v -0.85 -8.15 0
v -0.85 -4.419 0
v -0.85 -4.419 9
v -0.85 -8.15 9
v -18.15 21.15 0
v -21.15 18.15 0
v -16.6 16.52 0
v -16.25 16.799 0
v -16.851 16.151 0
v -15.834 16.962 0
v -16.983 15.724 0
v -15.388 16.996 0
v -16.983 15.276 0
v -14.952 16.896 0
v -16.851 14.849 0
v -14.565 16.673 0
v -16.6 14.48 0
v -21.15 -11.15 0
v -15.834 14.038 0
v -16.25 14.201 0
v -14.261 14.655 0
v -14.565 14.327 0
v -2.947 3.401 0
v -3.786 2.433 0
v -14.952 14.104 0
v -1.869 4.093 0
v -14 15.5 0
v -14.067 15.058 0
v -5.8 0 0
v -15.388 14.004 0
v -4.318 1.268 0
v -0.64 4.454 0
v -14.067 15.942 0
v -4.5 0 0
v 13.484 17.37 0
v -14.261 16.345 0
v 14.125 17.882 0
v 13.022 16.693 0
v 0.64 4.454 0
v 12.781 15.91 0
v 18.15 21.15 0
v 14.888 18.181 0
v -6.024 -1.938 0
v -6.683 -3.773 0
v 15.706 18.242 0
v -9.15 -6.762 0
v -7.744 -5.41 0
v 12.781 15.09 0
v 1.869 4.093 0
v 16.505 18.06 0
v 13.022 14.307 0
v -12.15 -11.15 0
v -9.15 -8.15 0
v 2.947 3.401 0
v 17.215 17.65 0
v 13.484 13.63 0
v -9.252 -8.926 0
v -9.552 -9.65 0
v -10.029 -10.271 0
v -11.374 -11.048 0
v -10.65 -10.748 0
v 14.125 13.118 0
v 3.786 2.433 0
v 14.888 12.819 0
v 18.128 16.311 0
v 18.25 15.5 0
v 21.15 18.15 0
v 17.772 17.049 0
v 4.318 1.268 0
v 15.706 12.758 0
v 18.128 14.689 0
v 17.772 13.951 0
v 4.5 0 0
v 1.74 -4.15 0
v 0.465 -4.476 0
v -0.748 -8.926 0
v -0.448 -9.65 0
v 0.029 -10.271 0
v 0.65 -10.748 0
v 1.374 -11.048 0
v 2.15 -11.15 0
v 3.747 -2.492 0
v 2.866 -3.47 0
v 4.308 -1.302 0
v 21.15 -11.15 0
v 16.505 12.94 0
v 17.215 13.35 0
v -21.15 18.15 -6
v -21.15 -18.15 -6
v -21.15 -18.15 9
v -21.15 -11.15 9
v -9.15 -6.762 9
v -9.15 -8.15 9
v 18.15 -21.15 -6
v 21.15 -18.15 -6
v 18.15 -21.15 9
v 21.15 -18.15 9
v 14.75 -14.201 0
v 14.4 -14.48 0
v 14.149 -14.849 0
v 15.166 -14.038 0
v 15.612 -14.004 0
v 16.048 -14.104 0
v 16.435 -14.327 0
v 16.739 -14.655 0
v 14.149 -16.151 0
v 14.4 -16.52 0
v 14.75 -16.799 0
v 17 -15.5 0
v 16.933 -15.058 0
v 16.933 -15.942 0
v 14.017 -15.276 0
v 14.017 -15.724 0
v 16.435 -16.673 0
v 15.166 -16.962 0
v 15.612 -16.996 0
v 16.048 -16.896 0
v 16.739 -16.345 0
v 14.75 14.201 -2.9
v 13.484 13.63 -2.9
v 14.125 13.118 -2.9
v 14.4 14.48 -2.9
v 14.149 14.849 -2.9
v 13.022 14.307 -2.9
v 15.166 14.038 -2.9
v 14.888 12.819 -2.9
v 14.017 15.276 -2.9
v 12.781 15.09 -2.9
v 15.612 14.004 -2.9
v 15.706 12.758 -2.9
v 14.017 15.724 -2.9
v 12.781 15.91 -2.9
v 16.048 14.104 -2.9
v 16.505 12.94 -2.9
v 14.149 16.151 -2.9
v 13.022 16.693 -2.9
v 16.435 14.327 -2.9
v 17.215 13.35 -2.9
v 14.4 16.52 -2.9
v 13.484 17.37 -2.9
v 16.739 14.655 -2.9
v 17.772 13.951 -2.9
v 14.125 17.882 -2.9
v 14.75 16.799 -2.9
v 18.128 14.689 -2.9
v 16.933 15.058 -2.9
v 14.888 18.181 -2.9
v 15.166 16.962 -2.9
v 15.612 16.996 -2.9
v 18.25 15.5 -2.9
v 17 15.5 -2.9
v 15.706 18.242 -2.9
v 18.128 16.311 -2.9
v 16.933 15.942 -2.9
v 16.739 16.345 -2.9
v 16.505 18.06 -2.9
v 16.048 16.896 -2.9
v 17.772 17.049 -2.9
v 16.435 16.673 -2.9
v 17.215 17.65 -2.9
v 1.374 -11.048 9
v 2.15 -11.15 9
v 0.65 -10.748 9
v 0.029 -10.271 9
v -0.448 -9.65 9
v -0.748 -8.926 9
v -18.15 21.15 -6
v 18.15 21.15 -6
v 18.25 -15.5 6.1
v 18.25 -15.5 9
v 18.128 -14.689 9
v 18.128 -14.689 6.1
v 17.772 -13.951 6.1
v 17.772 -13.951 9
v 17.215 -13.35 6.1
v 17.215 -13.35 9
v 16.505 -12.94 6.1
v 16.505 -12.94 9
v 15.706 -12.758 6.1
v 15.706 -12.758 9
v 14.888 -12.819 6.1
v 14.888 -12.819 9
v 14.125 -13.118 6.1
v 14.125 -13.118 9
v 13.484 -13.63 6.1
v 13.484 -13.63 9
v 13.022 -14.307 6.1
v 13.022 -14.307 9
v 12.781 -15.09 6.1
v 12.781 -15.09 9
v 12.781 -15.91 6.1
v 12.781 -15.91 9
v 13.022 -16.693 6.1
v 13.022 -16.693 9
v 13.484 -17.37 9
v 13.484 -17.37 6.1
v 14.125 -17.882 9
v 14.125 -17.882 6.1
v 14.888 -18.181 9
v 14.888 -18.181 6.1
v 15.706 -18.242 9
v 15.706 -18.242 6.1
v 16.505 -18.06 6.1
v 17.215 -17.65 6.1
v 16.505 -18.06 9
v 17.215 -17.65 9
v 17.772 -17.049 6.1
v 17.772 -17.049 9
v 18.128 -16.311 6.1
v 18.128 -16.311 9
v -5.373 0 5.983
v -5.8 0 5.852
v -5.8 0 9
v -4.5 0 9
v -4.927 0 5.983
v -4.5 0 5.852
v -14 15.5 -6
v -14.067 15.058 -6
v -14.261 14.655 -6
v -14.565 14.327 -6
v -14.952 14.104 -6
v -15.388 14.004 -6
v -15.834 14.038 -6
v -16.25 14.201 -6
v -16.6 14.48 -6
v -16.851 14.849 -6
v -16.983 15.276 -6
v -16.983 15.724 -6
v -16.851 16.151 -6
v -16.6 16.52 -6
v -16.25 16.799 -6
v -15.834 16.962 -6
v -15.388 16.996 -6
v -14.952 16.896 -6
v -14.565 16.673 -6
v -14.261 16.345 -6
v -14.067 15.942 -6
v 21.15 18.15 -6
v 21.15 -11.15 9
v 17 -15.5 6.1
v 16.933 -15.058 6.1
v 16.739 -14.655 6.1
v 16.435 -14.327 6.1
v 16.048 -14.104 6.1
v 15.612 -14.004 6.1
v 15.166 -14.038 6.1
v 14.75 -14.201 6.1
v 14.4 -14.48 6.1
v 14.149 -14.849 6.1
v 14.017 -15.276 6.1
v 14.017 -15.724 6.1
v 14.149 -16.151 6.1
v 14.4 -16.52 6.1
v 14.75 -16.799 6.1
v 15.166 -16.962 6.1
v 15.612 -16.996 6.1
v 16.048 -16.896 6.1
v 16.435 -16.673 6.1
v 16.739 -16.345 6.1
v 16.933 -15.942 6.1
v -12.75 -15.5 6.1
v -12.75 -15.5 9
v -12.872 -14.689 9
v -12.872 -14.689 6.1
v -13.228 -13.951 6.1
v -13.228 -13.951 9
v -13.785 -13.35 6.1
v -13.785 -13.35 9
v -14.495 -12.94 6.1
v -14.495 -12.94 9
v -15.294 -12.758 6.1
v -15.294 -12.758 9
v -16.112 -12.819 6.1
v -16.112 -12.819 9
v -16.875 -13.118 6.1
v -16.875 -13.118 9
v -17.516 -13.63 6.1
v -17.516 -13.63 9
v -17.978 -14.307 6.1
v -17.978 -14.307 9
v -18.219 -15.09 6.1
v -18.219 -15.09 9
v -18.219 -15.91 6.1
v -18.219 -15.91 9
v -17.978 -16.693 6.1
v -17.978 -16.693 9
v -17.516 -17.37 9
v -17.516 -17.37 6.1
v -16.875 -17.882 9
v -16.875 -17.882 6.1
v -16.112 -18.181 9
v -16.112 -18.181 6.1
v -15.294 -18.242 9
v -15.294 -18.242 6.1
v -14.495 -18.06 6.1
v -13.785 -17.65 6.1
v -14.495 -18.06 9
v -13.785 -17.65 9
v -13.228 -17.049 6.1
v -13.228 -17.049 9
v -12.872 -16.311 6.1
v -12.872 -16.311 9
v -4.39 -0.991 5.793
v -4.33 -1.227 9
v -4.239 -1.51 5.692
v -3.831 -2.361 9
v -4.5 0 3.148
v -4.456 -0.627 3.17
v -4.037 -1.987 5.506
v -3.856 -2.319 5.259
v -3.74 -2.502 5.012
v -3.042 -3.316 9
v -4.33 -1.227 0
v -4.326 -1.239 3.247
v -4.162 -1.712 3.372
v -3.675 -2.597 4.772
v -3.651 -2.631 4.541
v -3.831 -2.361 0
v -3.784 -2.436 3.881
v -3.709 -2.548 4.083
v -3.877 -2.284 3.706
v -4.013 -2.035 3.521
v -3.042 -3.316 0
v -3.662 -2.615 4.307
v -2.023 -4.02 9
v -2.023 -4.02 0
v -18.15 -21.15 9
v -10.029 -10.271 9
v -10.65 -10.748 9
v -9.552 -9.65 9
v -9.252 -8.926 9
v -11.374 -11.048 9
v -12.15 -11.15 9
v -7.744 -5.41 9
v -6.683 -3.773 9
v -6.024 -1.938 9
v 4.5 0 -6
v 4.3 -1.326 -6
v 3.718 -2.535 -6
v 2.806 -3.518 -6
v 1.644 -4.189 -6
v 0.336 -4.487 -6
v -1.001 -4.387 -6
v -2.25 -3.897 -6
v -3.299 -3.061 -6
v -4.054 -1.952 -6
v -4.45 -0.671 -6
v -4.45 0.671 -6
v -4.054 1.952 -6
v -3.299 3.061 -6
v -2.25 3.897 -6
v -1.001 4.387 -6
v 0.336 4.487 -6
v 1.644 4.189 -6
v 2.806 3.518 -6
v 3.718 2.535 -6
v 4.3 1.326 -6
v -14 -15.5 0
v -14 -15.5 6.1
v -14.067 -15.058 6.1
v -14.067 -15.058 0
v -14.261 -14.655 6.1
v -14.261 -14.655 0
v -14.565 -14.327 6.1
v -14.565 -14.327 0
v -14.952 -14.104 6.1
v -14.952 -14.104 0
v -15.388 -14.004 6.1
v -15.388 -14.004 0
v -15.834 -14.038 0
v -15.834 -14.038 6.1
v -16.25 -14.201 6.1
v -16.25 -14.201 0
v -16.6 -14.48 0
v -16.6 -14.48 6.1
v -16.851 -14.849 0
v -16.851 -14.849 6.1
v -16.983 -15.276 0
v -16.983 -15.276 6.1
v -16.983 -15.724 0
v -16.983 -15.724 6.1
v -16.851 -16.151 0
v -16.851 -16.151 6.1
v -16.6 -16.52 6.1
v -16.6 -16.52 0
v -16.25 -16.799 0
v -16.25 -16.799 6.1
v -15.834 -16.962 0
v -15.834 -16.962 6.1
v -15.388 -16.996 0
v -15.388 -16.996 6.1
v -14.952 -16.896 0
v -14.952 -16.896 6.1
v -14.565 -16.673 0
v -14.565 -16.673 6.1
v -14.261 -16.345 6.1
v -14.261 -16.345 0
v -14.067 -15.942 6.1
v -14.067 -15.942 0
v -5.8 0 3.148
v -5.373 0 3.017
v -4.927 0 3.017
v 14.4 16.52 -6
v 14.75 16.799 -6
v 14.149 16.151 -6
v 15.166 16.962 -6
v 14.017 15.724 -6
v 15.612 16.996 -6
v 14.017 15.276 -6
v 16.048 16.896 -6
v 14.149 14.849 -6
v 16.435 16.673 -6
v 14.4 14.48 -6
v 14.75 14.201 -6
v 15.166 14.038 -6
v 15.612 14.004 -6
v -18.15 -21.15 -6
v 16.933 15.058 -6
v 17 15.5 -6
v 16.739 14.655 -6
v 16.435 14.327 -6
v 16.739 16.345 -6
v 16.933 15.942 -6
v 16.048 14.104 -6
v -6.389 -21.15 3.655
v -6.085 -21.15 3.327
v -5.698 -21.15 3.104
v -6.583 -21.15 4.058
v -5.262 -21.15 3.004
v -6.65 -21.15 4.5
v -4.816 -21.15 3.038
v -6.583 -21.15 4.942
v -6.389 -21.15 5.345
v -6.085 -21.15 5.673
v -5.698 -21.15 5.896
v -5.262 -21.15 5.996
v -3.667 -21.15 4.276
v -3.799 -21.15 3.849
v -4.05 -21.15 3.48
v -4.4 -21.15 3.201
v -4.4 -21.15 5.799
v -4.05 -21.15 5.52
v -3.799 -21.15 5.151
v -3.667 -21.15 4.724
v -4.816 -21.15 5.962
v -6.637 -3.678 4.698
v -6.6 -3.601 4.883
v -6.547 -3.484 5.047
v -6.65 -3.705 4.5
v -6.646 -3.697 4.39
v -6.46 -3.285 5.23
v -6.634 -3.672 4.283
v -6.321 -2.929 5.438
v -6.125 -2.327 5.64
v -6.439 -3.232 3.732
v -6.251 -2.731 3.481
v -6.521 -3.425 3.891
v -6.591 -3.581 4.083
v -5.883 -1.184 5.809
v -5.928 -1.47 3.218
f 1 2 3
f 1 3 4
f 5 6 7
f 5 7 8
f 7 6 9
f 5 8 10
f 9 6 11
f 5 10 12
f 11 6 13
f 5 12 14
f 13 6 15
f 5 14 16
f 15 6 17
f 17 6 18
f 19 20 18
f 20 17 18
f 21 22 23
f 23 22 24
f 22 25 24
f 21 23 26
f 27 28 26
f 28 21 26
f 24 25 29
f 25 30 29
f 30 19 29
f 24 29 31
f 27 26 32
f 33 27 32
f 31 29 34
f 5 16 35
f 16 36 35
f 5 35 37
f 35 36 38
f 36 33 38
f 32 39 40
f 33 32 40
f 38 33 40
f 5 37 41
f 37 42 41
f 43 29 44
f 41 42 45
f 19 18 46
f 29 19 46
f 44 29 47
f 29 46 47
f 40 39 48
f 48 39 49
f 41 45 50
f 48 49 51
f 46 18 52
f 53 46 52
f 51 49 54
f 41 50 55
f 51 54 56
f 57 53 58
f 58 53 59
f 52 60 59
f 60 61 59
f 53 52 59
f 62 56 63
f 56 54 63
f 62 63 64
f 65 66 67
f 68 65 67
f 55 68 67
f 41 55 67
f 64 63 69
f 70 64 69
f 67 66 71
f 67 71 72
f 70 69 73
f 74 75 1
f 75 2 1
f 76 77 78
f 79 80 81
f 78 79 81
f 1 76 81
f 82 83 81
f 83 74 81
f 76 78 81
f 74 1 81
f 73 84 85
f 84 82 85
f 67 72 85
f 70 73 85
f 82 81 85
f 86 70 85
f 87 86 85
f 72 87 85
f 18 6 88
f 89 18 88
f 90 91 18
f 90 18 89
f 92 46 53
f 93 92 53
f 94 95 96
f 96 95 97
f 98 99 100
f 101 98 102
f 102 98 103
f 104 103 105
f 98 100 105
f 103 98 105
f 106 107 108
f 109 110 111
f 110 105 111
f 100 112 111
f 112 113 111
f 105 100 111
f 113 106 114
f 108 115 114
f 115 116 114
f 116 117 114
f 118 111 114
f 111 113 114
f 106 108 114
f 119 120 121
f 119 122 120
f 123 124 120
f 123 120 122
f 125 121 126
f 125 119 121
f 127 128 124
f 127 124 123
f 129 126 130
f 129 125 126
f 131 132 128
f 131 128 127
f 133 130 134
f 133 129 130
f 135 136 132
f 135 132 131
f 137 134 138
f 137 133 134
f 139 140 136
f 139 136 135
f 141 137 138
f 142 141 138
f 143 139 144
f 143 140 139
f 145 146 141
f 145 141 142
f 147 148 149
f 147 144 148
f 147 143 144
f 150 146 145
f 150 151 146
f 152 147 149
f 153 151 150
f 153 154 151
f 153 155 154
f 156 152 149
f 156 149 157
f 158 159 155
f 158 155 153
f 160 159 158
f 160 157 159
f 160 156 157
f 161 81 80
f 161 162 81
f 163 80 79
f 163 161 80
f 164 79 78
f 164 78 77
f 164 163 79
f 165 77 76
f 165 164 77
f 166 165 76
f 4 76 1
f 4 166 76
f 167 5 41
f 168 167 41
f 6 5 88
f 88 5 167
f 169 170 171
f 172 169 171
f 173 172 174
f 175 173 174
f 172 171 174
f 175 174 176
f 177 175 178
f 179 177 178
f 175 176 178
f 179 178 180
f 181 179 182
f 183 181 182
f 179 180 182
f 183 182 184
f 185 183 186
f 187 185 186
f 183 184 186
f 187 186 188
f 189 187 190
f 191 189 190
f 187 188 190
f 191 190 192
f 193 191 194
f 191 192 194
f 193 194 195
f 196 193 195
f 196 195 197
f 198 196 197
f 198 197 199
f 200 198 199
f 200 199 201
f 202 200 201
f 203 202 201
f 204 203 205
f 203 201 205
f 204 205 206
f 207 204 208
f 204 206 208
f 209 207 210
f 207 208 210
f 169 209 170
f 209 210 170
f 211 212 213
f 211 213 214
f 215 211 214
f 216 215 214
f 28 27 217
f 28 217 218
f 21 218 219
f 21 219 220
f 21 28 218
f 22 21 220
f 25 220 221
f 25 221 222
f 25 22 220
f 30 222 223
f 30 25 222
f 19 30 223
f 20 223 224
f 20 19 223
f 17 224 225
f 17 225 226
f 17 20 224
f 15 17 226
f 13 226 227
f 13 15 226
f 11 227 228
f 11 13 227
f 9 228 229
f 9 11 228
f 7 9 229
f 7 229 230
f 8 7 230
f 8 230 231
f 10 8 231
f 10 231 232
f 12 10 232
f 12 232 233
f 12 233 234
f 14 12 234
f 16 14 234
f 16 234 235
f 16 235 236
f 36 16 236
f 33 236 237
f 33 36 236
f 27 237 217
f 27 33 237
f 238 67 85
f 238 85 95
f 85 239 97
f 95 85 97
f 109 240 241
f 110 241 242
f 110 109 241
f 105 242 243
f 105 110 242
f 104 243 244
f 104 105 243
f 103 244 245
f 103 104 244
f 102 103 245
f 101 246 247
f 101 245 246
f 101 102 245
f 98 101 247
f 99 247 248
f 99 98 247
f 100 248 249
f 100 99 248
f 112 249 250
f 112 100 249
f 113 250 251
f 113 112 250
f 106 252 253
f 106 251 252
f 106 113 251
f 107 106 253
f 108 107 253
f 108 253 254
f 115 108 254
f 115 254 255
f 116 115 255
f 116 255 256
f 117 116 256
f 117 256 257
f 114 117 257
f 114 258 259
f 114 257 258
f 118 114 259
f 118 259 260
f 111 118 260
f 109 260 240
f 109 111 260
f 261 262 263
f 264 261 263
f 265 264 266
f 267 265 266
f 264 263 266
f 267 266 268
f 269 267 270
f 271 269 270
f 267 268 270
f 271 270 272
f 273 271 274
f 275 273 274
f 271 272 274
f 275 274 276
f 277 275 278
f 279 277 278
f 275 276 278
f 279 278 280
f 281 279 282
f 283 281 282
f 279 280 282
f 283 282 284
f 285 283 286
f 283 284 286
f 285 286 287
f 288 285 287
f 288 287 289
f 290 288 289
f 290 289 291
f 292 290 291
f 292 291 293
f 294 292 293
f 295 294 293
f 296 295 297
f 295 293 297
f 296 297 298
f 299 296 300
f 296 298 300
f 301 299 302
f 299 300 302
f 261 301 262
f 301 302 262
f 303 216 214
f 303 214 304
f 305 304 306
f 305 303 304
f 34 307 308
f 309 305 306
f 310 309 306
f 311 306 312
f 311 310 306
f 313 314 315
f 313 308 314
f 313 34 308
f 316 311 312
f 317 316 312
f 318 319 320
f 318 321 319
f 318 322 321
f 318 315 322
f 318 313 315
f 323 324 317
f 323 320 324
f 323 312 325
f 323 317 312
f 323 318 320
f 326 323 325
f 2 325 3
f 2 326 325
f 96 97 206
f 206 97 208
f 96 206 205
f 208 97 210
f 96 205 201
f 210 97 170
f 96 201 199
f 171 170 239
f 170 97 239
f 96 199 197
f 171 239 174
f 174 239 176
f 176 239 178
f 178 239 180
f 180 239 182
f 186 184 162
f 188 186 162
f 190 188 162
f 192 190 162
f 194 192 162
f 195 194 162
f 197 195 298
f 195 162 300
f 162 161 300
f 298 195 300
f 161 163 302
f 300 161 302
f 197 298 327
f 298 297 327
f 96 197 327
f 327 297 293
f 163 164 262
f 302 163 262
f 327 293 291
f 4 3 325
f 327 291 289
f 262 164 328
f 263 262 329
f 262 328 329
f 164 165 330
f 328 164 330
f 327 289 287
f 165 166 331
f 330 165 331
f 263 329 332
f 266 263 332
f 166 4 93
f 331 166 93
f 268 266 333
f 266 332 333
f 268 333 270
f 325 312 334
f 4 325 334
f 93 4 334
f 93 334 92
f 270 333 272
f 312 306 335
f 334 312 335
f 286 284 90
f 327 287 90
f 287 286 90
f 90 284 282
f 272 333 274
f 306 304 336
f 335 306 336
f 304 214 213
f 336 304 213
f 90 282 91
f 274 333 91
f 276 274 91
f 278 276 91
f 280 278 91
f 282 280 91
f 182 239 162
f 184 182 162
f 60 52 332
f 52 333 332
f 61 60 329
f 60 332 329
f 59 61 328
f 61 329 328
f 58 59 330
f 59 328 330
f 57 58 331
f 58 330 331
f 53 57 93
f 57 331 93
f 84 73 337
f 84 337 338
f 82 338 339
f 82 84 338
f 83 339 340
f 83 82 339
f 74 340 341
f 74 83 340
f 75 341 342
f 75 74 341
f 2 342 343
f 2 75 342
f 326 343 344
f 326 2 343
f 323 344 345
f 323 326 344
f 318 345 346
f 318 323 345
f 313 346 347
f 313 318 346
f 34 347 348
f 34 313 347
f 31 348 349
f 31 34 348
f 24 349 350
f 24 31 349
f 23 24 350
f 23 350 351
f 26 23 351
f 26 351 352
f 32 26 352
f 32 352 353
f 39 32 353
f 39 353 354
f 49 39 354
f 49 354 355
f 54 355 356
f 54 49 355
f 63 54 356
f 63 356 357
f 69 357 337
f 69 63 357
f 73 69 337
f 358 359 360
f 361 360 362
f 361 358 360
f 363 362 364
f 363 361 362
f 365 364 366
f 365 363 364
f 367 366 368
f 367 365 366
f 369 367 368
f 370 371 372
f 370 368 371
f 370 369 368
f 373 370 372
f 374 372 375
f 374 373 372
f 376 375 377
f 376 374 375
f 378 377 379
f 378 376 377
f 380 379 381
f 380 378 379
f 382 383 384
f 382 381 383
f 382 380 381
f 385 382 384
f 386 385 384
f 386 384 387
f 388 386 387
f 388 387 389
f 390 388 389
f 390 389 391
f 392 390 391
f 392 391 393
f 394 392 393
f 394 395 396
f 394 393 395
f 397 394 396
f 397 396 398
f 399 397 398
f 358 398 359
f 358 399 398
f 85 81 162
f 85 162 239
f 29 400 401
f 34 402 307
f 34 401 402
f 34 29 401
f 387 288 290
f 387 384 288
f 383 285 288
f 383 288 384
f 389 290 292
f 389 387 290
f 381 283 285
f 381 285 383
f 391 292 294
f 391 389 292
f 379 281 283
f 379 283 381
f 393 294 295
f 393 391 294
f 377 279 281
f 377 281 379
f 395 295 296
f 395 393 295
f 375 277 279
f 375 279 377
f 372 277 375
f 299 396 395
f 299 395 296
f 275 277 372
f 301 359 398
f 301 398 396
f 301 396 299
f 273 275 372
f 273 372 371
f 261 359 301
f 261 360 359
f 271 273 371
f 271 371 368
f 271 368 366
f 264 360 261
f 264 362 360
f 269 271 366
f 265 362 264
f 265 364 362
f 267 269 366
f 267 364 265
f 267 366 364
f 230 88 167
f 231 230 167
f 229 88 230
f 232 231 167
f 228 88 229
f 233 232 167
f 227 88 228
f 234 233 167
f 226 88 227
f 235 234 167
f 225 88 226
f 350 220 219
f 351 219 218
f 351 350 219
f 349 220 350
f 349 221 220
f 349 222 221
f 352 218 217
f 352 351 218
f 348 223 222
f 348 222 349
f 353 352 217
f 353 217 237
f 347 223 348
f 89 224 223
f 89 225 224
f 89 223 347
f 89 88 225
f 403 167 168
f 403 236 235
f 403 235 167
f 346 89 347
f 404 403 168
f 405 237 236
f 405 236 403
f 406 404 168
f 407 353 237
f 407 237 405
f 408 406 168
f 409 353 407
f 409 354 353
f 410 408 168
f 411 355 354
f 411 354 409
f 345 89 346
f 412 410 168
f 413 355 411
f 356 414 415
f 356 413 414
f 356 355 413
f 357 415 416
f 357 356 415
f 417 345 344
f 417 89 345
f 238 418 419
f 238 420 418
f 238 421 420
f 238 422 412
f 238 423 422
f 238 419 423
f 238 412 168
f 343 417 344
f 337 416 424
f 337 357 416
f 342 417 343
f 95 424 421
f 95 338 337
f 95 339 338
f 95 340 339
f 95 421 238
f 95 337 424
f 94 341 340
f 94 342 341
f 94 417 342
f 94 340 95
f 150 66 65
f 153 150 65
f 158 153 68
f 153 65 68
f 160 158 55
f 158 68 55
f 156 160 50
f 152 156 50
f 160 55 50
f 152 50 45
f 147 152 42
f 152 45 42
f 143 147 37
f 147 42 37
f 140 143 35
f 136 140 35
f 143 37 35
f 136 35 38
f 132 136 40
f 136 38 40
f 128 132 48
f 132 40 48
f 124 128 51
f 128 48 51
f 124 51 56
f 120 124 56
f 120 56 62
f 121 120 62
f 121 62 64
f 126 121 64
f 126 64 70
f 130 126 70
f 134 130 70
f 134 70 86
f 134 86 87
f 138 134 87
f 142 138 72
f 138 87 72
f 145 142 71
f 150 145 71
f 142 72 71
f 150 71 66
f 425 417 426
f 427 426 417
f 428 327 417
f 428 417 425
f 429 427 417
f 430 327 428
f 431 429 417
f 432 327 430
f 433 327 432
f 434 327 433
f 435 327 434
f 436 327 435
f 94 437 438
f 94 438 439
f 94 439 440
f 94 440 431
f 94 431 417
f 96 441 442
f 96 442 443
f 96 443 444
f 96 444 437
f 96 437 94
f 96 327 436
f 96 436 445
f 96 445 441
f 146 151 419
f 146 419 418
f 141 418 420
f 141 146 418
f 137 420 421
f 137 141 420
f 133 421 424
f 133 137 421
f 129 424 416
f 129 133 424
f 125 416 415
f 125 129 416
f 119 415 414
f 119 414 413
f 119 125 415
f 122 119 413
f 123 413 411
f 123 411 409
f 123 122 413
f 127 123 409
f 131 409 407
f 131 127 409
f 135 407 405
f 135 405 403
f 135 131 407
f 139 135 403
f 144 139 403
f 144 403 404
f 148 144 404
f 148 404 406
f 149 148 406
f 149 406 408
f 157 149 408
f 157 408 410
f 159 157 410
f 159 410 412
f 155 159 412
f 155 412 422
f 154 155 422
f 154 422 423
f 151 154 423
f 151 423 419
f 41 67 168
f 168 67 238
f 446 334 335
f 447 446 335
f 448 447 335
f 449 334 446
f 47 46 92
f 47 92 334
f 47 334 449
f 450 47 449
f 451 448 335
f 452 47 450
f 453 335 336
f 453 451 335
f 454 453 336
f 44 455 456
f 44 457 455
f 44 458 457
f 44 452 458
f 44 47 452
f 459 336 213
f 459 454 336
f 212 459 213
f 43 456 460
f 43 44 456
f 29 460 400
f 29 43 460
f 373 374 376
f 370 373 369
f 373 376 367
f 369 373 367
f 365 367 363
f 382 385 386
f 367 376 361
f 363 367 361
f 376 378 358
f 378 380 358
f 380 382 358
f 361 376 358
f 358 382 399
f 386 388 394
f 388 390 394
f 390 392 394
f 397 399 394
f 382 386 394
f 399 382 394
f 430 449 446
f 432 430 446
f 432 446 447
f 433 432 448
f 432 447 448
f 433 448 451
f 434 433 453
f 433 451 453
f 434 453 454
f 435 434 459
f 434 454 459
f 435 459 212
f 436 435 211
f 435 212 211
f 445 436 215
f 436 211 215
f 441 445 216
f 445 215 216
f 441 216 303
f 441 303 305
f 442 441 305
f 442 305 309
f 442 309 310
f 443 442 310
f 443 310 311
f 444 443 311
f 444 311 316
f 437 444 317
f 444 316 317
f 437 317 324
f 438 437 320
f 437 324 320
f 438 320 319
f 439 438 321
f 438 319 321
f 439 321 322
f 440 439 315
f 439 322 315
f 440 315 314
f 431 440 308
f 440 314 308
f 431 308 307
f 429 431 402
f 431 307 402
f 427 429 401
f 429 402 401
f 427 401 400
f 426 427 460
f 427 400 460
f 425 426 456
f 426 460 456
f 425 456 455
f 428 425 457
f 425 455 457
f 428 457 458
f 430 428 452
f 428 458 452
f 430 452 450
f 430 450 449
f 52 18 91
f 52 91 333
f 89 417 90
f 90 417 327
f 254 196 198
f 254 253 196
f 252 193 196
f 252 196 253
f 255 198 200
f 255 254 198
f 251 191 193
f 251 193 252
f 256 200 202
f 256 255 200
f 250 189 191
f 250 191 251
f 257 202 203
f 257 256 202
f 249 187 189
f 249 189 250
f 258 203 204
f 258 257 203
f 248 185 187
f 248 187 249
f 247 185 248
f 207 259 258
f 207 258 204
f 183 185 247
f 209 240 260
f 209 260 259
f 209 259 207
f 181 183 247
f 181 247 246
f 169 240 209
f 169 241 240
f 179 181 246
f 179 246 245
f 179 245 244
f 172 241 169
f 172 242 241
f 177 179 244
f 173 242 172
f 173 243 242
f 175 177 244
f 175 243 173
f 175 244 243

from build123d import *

# Parameters (mm, degrees)
SKETCH_R        = 1.5
PAD_DEPTH       = 9
FILLET_R        = 3
SKETCH001_W     = 42.3
SKETCH001_H     = 42.3
SKETCH001_R     = 1.5
SKETCH001_R_2   = 4.5
PAD001_DEPTH    = 6
SKETCH002_R     = 1.5
POCKET_DEPTH    = 21.15
CHAMFER_SIZE    = 3
SKETCH003_R     = 2.75
POCKET001_DEPTH = 2.9
SKETCH004_R     = 2.75
POCKET002_DEPTH = 2.9


with BuildPart() as part:
    # Sketch → Pad (new body)
    with BuildSketch(Plane.XY):
        with BuildLine():
            Line((-21.15, -11.15), (-9.15, -11.15))
            Line((-9.15, -6.762211), (-9.15, -11.15))
            ThreePointArc((-9.15, -6.762211), (-6.683406, -3.773261), (-5.8, 0))
            Line((-5.8, 0), (-4.5, 0))
            ThreePointArc((-4.5, 0), (-3.46951, -2.865746), (-0.85, -4.418993))
            Line((-0.85, -4.418993), (-0.85, -11.15))
            Line((-0.85, -11.15), (21.15, -11.15))
            Line((21.15, -11.15), (21.15, -21.15))
            Line((21.15, -21.15), (-21.15, -21.15))
            Line((-21.15, -21.15), (-21.15, -11.15))
        make_face()
        with Locations((-15.5, -15.5)):
            Circle(SKETCH_R, mode=Mode.SUBTRACT)
        with Locations((15.5, -15.5)):
            Circle(SKETCH_R, mode=Mode.SUBTRACT)
    extrude(amount=PAD_DEPTH)

    # Fillet
    fillet_edges = [part.edges().sort_by_distance(p)[0] for p in [
        (-9.15, -11.15, 4.5),
        (-0.85, -11.15, 4.5),
    ]]
    fillet(fillet_edges, radius=FILLET_R)

    # Sketch001 → Pad001 (new body)
    with BuildSketch(Plane(origin=(0, 0, 0), x_dir=(1, 0, 0), z_dir=(0, 0, -1))):
        Rectangle(SKETCH001_W, SKETCH001_H)
        with Locations((15.5, -15.5)):
            Circle(SKETCH001_R, mode=Mode.SUBTRACT)
        with Locations((-15.5, -15.5)):
            Circle(SKETCH001_R, mode=Mode.SUBTRACT)
        Circle(SKETCH001_R_2, mode=Mode.SUBTRACT)
    extrude(amount=PAD001_DEPTH)

    # Sketch002 → Pocket (cut)
    with BuildSketch(Plane(origin=(0, 0, 0), x_dir=(-1, 0, 0), z_dir=(0, 1, 0))):
        with Locations((5.15, 4.5)):
            Circle(SKETCH002_R)
    extrude(amount=-POCKET_DEPTH, mode=Mode.SUBTRACT)

    # Chamfer
    chamfer_edges = [part.edges().sort_by_distance(p)[0] for p in [
        (-21.15, 21.15, -3),
        (-21.15, -21.15, -3),
        (21.15, -21.15, -3),
        (21.15, 21.15, -3),
    ]]
    chamfer(chamfer_edges, length=CHAMFER_SIZE)

    # Sketch003 → Pocket001 (cut)
    with BuildSketch(Plane.XY.offset(9)):
        with Locations((15.5, -15.5)):
            Circle(SKETCH003_R)
        with Locations((-15.5, -15.5)):
            Circle(SKETCH003_R)
    extrude(amount=-POCKET001_DEPTH, mode=Mode.SUBTRACT)

    # Sketch004 → Pocket002 (cut)
    with BuildSketch(Plane.XY):
        with Locations((15.5, 15.5)):
            Circle(SKETCH004_R)
    extrude(amount=-POCKET002_DEPTH, mode=Mode.SUBTRACT)


solid = part.part
